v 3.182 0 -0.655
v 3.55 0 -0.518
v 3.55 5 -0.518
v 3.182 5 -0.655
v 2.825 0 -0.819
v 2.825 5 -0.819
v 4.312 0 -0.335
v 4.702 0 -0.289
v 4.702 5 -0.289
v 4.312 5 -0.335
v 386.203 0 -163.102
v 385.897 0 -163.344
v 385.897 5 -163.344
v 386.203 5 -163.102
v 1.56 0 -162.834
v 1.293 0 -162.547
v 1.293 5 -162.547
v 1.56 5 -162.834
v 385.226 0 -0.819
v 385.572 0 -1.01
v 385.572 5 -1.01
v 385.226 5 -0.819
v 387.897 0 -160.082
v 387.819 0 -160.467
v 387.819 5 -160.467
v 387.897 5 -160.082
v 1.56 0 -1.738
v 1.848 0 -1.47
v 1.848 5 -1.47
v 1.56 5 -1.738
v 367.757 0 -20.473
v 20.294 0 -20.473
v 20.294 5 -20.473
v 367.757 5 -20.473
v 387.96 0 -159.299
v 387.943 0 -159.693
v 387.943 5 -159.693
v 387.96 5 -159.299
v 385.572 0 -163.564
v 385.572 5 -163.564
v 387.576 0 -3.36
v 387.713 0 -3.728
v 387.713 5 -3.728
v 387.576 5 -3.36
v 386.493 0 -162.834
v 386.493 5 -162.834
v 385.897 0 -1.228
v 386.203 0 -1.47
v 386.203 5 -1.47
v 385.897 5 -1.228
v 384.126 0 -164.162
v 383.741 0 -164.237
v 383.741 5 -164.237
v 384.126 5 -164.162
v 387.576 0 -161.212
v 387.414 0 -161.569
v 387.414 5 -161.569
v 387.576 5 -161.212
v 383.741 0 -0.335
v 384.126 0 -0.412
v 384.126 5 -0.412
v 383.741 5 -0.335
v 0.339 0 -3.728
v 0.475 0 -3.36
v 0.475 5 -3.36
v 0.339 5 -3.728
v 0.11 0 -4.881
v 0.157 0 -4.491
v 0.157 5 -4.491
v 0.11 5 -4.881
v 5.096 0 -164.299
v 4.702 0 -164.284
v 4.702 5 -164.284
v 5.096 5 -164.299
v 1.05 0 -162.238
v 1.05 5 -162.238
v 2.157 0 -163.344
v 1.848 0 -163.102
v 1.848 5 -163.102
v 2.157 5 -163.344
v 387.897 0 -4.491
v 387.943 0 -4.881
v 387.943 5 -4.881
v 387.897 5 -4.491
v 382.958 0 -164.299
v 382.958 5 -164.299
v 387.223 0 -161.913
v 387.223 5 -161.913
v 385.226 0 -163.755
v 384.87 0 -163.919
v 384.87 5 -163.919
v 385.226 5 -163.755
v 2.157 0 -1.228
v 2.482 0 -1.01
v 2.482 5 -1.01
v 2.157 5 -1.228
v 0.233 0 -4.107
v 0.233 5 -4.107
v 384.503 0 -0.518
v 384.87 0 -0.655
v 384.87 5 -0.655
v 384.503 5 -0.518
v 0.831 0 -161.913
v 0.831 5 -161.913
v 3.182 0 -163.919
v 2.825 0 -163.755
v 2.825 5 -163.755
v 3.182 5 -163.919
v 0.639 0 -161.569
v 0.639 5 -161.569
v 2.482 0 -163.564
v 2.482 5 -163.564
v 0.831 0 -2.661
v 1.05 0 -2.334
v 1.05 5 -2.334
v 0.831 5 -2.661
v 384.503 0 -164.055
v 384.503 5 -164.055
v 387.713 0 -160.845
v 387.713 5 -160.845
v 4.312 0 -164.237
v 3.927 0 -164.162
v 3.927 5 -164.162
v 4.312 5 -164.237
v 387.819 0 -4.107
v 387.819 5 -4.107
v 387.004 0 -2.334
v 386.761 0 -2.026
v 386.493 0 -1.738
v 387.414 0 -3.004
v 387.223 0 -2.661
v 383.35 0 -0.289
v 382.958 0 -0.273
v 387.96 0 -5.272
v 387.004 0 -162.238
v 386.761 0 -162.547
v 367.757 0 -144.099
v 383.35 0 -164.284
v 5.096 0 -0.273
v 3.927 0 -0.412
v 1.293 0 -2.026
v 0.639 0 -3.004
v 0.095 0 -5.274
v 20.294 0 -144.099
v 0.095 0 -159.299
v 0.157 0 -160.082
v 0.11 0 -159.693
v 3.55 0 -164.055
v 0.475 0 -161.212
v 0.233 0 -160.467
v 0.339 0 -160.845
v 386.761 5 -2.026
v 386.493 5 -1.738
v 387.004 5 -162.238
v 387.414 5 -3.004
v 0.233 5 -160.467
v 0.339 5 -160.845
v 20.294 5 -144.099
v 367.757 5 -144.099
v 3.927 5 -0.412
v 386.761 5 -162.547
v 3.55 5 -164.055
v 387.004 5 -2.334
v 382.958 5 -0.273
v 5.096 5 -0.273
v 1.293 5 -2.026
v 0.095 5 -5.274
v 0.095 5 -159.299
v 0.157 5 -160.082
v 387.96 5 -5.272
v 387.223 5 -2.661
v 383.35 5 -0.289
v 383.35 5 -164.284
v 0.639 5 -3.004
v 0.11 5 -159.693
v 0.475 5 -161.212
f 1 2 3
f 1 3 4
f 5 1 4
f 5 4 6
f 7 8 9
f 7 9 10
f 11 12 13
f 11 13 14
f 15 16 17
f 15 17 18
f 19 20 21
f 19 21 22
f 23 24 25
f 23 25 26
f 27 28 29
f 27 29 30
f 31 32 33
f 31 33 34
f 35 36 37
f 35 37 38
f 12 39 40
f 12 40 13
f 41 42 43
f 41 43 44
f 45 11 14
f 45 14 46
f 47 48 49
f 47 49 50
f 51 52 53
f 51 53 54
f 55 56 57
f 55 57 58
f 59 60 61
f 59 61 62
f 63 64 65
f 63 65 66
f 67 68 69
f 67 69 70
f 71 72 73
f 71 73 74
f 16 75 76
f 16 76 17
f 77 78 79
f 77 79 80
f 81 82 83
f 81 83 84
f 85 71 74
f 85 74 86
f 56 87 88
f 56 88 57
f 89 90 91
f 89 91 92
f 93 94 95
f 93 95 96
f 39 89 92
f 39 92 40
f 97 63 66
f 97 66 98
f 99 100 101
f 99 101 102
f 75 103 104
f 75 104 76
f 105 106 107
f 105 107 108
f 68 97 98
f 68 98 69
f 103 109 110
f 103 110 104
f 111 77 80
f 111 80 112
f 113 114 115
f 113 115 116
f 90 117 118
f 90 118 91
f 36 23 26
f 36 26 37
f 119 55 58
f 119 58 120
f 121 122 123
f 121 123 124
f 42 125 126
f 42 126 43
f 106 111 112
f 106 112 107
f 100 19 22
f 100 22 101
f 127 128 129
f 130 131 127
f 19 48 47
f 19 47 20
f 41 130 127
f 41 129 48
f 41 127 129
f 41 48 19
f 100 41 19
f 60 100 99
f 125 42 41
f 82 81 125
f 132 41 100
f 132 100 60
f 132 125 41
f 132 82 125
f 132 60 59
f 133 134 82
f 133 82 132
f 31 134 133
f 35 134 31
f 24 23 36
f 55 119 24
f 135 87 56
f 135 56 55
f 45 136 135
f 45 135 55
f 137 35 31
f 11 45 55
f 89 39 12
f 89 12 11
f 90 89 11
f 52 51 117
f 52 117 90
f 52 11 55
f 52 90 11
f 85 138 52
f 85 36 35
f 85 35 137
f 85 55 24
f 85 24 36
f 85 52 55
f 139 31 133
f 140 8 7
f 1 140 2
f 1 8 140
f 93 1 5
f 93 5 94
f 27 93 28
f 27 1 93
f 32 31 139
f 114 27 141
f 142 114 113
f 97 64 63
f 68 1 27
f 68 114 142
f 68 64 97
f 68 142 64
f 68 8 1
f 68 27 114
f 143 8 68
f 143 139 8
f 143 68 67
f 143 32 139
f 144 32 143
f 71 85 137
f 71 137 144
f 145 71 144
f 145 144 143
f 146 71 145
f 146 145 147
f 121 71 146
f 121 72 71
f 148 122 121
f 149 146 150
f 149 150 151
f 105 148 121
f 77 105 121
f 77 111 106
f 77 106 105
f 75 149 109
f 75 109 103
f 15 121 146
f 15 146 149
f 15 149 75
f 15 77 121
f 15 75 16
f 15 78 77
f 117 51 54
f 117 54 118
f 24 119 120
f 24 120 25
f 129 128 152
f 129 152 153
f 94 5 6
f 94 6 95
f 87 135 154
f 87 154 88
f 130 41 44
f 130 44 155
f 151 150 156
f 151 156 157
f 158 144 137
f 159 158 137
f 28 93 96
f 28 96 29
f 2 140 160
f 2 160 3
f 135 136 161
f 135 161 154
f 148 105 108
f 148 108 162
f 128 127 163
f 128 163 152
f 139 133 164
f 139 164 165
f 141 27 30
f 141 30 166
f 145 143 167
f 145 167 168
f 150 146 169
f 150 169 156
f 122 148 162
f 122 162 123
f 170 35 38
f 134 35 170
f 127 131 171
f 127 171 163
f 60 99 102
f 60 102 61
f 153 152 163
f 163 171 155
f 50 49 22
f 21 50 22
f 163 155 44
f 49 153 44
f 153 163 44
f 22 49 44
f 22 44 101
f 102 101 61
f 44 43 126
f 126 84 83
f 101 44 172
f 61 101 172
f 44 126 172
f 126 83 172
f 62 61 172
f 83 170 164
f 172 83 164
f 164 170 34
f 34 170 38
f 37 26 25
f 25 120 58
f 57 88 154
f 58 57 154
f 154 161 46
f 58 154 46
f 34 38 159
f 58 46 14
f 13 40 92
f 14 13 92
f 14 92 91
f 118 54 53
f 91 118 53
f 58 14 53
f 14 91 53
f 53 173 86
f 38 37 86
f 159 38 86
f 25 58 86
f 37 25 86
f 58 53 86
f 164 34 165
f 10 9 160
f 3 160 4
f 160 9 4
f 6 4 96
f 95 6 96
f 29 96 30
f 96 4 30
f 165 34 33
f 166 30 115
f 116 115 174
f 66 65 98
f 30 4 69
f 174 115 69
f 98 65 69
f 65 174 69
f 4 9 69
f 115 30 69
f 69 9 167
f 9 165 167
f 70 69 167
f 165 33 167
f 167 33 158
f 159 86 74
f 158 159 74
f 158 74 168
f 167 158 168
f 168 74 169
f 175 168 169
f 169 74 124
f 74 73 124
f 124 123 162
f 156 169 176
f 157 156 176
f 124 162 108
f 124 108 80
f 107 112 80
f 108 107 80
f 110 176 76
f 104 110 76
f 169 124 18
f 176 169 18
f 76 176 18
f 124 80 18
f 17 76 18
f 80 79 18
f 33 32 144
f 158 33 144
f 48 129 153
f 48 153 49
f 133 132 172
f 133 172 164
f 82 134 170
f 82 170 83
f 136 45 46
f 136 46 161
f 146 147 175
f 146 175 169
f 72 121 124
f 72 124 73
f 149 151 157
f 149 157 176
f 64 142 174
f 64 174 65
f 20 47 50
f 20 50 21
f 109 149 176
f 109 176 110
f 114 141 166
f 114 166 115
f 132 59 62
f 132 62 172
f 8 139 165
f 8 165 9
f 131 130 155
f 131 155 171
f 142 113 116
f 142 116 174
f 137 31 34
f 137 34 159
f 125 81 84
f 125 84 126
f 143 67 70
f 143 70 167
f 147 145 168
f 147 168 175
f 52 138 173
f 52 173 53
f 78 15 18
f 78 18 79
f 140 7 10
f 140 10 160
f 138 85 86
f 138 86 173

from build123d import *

# Parameters (mm, degrees)
SKETCH1_W           = 347.4626
SKETCH1_H           = 123.6255
BOSS_EXTRUDE1_DEPTH = 5


with BuildPart() as part:
    # Sketch1 → Boss-Extrude1 (new body)
    with BuildSketch(Plane(origin=(0, 0, 0), x_dir=(1, 0, 0), z_dir=(0, 1, 0))):
        Polygon((382.958, 164.299), (383.35, 164.284), (383.741, 164.237), (384.126, 164.162), (384.503, 164.055), (384.87, 163.919), (385.226, 163.755), (385.572, 163.564), (385.897, 163.344), (386.203, 163.102), (386.493, 162.834), (386.761, 162.547), (387.004, 162.238), (387.223, 161.913), (387.414, 161.569), (387.576, 161.212), (387.713, 160.845), (387.819, 160.467), (387.897, 160.082), (387.943, 159.693), (387.96, 159.299), (387.96, 5.27237), (387.943, 4.881), (387.897, 4.49104), (387.819, 4.10655), (387.713, 3.72759), (387.576, 3.35966), (387.414, 3.00412), (387.223, 2.66099), (387.004, 2.3344), (386.761, 2.02572), (386.493, 1.73771), (386.203, 1.47037), (385.897, 1.22783), (385.572, 1.0101), (385.226, 0.818554), (384.87, 0.654569), (384.503, 0.518142), (384.126, 0.412034), (383.741, 0.334863), (383.35, 0.289388), (382.958, 0.272852), (5.09598, 0.272852), (4.70186, 0.289388), (4.3119, 0.334863), (3.9274, 0.412034), (3.54983, 0.518142), (3.18189, 0.654569), (2.82498, 0.818554), (2.48185, 1.0101), (2.15663, 1.22783), (1.84795, 1.47037), (1.55994, 1.73771), (1.2926, 2.02572), (1.05006, 2.3344), (0.830957, 2.66099), (0.63941, 3.00412), (0.475424, 3.35966), (0.338998, 3.72759), (0.232888, 4.10655), (0.157097, 4.49104), (0.110243, 4.881), (0.0950846, 5.27375), (0.0950846, 159.299), (0.110243, 159.693), (0.157097, 160.082), (0.232888, 160.467), (0.338998, 160.845), (0.475424, 161.212), (0.63941, 161.569), (0.830957, 161.913), (1.05006, 162.238), (1.2926, 162.547), (1.55994, 162.834), (1.84795, 163.102), (2.15663, 163.344), (2.48185, 163.564), (2.82498, 163.755), (3.18189, 163.919), (3.54983, 164.055), (3.9274, 164.162), (4.3119, 164.237), (4.70186, 164.284), (5.09598, 164.299), align=None)
        with Locations((194.0257, 82.28625)):
            Rectangle(SKETCH1_W, SKETCH1_H, mode=Mode.SUBTRACT)
    extrude(amount=BOSS_EXTRUDE1_DEPTH)


solid = part.part
